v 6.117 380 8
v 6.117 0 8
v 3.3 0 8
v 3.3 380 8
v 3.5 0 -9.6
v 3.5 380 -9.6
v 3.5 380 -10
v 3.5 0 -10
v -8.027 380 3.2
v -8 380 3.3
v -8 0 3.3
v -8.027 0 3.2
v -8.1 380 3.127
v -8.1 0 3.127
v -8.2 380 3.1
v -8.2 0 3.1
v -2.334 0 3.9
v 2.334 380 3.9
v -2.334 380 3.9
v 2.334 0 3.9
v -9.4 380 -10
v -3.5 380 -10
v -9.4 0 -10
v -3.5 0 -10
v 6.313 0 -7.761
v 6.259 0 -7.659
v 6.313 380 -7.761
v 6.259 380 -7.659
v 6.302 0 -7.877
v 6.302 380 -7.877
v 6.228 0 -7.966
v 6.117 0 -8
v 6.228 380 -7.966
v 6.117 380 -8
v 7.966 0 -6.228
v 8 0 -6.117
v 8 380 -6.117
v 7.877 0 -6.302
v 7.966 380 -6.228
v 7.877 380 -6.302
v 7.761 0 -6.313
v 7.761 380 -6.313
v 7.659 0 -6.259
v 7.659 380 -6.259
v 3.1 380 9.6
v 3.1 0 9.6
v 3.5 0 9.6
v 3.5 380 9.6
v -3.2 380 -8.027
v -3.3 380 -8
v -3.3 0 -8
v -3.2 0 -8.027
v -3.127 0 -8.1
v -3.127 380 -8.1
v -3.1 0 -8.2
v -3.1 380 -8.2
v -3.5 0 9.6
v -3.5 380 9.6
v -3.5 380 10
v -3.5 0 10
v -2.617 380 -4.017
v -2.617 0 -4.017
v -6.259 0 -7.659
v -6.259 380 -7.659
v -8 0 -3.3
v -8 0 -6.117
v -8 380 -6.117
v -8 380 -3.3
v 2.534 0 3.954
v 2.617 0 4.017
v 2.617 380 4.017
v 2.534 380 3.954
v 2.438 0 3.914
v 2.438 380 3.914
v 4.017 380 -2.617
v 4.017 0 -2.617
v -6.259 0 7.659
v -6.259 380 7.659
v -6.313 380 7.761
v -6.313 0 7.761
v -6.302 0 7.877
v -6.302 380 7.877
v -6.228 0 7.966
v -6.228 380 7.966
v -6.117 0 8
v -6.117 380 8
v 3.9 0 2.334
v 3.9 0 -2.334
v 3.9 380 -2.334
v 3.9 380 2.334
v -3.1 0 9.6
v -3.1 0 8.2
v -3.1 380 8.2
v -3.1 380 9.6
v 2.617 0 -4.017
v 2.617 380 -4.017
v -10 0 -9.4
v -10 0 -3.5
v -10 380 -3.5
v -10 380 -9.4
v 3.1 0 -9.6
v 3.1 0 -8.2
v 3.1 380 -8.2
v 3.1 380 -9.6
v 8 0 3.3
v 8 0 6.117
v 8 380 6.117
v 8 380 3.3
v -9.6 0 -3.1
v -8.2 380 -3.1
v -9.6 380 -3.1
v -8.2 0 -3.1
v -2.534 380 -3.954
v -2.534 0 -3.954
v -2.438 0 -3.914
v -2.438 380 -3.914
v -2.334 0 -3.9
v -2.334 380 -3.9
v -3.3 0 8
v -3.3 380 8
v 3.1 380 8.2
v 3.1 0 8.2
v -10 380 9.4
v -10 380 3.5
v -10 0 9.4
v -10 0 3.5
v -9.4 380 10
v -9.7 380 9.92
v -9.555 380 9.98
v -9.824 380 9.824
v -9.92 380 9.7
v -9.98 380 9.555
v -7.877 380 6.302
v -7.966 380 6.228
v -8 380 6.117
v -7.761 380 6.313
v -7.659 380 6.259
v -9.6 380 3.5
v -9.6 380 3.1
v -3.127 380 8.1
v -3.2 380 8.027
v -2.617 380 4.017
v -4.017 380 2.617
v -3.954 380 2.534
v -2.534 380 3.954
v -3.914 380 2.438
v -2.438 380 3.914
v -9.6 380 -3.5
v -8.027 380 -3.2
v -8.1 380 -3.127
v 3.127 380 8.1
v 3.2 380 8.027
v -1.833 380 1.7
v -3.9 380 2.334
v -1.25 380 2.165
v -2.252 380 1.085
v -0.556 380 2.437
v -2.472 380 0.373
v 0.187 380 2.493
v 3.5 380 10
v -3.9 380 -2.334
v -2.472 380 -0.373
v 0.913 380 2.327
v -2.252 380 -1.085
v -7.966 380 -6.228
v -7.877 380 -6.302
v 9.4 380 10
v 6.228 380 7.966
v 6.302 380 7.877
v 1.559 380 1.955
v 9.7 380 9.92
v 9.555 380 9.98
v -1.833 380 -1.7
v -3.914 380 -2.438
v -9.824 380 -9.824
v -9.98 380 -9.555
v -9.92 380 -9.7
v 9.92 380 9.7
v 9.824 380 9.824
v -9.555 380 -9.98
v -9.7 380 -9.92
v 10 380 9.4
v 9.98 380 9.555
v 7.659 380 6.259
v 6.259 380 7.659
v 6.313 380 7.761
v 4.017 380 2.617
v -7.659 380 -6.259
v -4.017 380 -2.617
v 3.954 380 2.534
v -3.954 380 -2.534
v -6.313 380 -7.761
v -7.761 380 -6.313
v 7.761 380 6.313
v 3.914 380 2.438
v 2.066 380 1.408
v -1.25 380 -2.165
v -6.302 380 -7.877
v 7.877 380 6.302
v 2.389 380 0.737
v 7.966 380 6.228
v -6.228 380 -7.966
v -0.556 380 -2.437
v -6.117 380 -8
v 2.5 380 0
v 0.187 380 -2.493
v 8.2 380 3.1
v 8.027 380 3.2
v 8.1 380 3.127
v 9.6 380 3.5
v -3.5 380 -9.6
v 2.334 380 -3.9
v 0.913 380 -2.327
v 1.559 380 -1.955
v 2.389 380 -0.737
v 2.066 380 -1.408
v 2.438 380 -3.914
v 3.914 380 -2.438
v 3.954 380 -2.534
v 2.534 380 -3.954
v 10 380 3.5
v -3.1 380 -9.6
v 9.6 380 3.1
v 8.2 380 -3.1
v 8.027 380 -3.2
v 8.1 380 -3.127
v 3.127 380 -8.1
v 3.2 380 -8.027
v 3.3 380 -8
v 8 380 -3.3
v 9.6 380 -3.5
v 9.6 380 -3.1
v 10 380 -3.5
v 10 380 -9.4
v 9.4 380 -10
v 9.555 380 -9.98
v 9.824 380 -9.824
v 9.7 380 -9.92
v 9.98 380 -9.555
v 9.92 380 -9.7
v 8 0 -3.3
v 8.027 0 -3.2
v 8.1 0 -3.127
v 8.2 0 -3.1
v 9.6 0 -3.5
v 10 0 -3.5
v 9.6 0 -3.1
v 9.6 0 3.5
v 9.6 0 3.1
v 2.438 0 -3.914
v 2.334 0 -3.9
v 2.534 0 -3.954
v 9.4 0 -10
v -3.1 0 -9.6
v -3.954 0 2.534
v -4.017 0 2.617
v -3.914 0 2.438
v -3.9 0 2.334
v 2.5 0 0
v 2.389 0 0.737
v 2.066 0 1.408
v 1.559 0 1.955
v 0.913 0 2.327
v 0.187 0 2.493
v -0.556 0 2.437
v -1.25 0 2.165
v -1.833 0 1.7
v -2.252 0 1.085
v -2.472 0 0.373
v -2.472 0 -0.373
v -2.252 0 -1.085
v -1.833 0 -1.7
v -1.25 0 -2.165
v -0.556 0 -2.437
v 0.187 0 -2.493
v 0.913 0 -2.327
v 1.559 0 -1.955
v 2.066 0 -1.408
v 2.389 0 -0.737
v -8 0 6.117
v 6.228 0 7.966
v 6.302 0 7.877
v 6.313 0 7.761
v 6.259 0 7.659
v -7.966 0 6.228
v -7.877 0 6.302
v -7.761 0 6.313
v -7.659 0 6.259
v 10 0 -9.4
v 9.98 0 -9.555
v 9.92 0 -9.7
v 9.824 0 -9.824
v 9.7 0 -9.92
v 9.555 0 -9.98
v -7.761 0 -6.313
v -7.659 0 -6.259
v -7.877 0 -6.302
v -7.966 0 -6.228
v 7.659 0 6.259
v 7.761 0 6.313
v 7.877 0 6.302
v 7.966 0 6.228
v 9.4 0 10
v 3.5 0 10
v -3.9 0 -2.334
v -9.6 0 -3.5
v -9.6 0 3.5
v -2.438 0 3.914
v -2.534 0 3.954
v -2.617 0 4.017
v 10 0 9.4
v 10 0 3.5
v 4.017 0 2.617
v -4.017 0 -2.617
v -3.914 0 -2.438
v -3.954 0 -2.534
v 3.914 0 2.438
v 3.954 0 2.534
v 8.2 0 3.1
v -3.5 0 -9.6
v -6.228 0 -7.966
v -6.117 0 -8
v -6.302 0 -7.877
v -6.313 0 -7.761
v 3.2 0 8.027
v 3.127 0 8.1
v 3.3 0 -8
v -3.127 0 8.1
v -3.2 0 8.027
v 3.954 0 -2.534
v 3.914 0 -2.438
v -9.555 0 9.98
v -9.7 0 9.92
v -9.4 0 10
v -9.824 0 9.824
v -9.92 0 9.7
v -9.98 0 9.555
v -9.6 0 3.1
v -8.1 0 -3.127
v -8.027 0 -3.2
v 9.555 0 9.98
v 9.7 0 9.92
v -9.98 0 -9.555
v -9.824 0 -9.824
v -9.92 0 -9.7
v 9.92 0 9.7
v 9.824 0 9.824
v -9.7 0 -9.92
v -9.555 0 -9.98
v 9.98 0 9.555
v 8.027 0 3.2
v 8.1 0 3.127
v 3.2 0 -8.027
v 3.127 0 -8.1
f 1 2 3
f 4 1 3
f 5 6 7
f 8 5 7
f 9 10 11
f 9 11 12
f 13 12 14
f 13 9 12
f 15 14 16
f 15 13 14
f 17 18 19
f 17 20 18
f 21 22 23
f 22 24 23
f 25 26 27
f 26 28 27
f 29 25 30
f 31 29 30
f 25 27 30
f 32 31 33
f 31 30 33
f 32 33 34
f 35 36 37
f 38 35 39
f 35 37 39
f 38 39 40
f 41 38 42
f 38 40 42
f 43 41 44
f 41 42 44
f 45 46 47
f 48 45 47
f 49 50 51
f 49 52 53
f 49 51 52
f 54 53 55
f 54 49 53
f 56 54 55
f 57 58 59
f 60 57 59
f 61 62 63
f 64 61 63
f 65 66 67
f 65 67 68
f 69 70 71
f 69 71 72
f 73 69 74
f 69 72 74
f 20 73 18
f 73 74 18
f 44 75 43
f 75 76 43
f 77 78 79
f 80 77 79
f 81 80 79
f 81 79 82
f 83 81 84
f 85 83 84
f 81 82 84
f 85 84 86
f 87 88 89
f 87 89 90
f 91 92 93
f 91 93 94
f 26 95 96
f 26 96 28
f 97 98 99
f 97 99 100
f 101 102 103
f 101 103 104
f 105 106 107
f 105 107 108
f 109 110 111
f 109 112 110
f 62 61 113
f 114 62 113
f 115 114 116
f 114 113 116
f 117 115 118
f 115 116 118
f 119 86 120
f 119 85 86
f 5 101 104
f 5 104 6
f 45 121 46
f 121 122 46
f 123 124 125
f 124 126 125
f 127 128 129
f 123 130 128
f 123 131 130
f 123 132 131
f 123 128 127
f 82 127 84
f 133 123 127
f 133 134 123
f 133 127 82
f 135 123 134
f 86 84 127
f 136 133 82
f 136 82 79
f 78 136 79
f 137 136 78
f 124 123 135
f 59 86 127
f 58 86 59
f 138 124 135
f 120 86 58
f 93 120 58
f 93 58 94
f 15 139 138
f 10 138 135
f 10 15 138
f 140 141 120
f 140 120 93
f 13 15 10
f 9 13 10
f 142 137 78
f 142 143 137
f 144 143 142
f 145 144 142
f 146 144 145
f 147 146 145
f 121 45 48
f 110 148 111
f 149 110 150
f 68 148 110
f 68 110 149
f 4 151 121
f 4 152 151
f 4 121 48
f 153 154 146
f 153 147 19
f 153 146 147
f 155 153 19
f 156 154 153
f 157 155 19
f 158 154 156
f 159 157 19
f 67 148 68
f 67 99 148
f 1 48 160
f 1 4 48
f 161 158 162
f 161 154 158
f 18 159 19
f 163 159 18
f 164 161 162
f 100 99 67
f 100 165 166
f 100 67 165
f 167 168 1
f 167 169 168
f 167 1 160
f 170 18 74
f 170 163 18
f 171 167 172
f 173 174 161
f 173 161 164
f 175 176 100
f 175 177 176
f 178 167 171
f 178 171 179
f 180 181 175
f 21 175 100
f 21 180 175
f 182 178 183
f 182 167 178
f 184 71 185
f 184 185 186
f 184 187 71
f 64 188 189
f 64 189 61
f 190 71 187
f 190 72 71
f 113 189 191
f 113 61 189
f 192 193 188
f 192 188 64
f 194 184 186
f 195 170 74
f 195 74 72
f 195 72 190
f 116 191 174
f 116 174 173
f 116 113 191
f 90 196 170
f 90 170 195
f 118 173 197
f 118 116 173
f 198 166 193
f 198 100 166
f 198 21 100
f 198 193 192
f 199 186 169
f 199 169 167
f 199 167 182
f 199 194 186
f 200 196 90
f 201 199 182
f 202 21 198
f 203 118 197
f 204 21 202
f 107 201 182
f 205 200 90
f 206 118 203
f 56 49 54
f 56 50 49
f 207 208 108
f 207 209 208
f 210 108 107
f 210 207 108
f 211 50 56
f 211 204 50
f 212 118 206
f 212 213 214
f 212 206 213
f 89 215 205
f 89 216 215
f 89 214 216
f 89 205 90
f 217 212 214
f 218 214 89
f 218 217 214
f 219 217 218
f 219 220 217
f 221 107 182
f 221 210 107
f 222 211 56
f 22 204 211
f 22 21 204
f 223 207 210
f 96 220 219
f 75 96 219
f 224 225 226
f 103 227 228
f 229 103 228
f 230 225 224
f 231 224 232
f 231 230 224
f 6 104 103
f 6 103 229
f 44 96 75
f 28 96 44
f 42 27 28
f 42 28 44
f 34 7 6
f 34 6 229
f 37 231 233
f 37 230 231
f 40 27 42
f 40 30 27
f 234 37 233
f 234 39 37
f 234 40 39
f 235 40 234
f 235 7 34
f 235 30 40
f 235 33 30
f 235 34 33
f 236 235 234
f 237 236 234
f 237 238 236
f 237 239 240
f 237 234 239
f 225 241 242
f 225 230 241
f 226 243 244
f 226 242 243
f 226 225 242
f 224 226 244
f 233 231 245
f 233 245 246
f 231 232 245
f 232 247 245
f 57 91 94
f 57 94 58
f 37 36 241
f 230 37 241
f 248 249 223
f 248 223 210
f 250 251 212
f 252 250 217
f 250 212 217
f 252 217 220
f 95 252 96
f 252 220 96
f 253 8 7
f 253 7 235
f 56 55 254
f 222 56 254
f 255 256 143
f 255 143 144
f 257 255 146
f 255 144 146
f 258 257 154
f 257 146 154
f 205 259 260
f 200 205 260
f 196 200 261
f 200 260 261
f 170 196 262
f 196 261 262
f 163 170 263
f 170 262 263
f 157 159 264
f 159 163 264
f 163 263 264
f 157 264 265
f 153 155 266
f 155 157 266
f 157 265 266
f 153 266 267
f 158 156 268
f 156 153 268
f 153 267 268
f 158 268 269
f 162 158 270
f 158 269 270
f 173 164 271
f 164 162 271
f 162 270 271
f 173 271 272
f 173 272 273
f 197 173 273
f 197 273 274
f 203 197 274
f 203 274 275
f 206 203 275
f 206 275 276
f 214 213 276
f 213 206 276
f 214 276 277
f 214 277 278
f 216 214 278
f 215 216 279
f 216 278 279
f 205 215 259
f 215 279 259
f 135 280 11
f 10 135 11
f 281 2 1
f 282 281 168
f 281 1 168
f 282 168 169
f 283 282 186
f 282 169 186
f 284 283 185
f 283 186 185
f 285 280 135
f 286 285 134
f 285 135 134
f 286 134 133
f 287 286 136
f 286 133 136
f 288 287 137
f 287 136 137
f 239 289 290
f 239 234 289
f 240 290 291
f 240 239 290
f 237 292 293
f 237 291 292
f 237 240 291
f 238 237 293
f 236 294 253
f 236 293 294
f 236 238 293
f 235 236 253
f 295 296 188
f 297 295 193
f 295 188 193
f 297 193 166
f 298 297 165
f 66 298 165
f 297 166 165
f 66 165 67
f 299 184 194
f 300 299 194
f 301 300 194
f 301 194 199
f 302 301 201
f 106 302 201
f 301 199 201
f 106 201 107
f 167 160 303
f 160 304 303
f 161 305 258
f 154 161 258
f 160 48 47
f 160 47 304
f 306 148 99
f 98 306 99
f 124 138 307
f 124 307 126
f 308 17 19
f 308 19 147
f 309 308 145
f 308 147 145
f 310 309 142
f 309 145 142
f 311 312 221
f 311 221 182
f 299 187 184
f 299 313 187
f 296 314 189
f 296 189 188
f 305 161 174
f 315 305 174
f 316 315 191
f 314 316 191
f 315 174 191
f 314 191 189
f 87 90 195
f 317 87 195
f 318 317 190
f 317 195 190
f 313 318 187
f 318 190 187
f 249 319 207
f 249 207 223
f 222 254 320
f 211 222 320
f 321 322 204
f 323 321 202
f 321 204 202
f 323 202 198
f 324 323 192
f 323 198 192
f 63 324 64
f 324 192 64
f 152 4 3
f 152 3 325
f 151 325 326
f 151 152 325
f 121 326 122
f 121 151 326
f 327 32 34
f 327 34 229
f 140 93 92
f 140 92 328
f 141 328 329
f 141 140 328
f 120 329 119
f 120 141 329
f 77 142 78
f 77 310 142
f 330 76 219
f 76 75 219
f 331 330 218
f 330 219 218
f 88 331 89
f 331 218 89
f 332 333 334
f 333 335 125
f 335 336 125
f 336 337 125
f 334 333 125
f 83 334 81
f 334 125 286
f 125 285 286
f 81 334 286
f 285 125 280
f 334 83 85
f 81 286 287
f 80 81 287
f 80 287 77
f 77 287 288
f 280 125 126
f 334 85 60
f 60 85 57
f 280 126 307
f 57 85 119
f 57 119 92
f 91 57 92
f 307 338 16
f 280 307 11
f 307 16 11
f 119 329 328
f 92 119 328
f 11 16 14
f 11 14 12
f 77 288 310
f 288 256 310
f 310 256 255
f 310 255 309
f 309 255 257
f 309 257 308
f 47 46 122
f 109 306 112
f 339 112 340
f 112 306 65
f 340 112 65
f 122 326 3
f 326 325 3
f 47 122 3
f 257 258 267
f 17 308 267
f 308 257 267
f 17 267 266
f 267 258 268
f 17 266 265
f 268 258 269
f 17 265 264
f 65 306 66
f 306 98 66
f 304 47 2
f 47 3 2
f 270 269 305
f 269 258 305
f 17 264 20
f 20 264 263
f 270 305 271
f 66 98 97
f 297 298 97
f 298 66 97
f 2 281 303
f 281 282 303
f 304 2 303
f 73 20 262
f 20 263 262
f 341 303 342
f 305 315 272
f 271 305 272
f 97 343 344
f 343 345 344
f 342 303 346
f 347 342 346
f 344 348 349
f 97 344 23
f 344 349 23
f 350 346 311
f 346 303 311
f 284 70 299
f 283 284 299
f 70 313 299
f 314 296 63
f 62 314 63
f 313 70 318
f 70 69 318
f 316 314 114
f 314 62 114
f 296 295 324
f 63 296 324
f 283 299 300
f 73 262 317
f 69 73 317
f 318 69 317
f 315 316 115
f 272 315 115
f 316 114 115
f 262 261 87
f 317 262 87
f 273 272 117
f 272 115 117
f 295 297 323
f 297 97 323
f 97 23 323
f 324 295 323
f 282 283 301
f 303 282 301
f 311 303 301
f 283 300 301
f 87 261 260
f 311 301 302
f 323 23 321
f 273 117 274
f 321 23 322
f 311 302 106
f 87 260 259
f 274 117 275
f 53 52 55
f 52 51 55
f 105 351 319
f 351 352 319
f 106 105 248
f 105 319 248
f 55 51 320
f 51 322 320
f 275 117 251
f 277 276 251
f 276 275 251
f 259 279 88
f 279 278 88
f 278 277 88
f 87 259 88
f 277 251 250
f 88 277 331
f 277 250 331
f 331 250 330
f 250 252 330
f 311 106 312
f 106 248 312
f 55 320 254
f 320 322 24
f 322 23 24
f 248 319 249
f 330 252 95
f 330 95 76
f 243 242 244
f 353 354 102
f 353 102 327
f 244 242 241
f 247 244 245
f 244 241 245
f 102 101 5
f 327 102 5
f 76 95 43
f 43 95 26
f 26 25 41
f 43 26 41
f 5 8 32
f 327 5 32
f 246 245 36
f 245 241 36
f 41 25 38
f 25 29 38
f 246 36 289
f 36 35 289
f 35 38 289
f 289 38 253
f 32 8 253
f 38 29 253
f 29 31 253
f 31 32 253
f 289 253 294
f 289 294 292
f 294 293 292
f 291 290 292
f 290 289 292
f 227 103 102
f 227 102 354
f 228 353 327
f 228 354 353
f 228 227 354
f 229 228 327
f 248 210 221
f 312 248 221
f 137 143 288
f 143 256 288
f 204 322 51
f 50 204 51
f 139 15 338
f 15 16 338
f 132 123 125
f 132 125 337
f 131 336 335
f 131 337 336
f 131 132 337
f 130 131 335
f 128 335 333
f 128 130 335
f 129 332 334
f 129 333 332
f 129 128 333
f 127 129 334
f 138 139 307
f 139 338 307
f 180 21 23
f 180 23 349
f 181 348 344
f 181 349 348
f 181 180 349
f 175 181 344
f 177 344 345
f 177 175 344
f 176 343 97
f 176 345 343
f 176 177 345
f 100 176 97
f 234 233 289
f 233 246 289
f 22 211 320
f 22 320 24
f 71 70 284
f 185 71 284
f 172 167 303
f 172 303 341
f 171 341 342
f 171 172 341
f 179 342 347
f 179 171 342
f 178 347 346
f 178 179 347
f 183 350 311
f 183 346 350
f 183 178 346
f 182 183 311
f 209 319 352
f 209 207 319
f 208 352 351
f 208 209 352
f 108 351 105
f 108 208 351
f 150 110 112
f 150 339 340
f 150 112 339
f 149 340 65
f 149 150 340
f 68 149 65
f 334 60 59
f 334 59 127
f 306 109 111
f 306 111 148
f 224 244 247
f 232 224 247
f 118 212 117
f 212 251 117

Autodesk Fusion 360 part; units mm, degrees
sketch "profile" plane through (0, 0, 0) normal (0, 1, 0) x (1, 0, 0)
  circle A0 centre (0, 0) radius 2.5
  line L0 (0, -3.9) -> (-2.5, -3.9)
  line L1 (4, -4) -> (-4, 4) construction
  line L2 (-3.9092, -3.9092) -> (4, 4) construction
  line L3 (10, -10) -> (-10, -10) construction
  line L4 (-10, -10) -> (-10, 10) construction
  line L5 (-10, 10) -> (10, 10) construction
  line L6 (10, 10) -> (10, -10) construction
  line L7 (10, -10) -> (-10, 10) construction
  line L8 (-10, -10) -> (10, 10) construction
  line L9 (8, -8) -> (-8, -8) construction
  line L10 (-8, -8) -> (-8, 8) construction
  line L11 (-8, 8) -> (8, 8) construction
  line L12 (8, 8) -> (8, -8) construction
  line L13 (8, -8) -> (-8, 8) construction
  line L14 (-8, -8) -> (8, 8) construction
  line L15 (0, -8) -> (0, -10) construction
  line L16 (0, -9) -> (-3.1, -9) construction
  line L17 (-3.1, -8) -> (-3.1, -9.6)
  line L18 (-1.75, -10) -> (-1.75, -9.6) construction
  line L19 (0, -9.6) -> (-3.5, -9.6) construction
  line L20 (-3.1, -9.6) -> (-3.5, -9.6)
  line L21 (-3.5, -9.6) -> (-3.5, -10)
  line L22 (0, 0) -> (0, -8) construction
  line L23 (-3.5, -10) -> (-10, -10)
  line L24 (-3.9092, -3.9092) -> (-2.5, -3.9) construction
  line L25 (-8, -8) -> (-6.6, -8) construction
  line L26 (-8, -8) -> (-8, -7) construction
  line L27 (-2.5, -3.9) -> (-6.6, -8)
  line L28 (-6.6, -8) -> (-3.1, -8)
  line L29 (0, -2.5) -> (0, -3.9) construction
  line L30 (-3.9, 0) -> (-3.9, -2.5)
  line L31 (-3.9, -2.5) -> (-8, -6.6)
  line L32 (-8, -6.6) -> (-8, -3.1)
  line L33 (-8, -3.1) -> (-9.6, -3.1)
  line L34 (-9.6, -3.1) -> (-9.6, -3.5)
  line L35 (-9.6, -3.5) -> (-10, -3.5)
  line L36 (-10, -3.5) -> (-10, -10)
  line L37 (0, 0) -> (10, 0) construction
  line L38 (3.9, 0) -> (3.9, -2.5)
  line L39 (3.9, -2.5) -> (8, -6.6)
  line L40 (8, -6.6) -> (8, -3.1)
  line L41 (8, -3.1) -> (9.6, -3.1)
  line L42 (9.6, -3.1) -> (9.6, -3.5)
  line L43 (9.6, -3.5) -> (10, -3.5)
  line L44 (10, -3.5) -> (10, -10)
  line L45 (0, -3.9) -> (2.5, -3.9)
  line L46 (6.6, -8) -> (3.1, -8)
  line L47 (3.1, -8) -> (3.1, -9.6)
  line L48 (3.1, -9.6) -> (3.5, -9.6)
  line L49 (3.5, -9.6) -> (3.5, -10)
  line L50 (3.5, -10) -> (10, -10)
  line L51 (2.5, -3.9) -> (6.6, -8)
  line L52 (-3.9, 0) -> (-3.9, 2.5)
  line L53 (-3.9, 2.5) -> (-8, 6.6)
  line L54 (-8, 6.6) -> (-8, 3.1)
  line L55 (-8, 3.1) -> (-9.6, 3.1)
  line L56 (-9.6, 3.1) -> (-9.6, 3.5)
  line L57 (-9.6, 3.5) -> (-10, 3.5)
  line L58 (-10, 3.5) -> (-10, 10)
  line L59 (0, 3.9) -> (-2.5, 3.9)
  line L60 (-6.6, 8) -> (-3.1, 8)
  line L61 (-3.1, 8) -> (-3.1, 9.6)
  line L62 (-3.1, 9.6) -> (-3.5, 9.6)
  line L63 (-3.5, 9.6) -> (-3.5, 10)
  line L64 (-3.5, 10) -> (-10, 10)
  line L65 (-2.5, 3.9) -> (-6.6, 8)
  line L66 (0, 3.9) -> (2.5, 3.9)
  line L67 (6.6, 8) -> (3.1, 8)
  line L68 (3.1, 8) -> (3.1, 9.6)
  line L69 (3.1, 9.6) -> (3.5, 9.6)
  line L70 (3.5, 9.6) -> (3.5, 10)
  line L71 (3.5, 10) -> (10, 10)
  line L72 (2.5, 3.9) -> (6.6, 8)
  line L73 (3.9, 0) -> (3.9, 2.5)
  line L74 (8, 6.6) -> (8, 3.1)
  line L75 (8, 3.1) -> (9.6, 3.1)
  line L76 (9.6, 3.1) -> (9.6, 3.5)
  line L77 (9.6, 3.5) -> (10, 3.5)
  line L78 (10, 3.5) -> (10, 10)
  line L79 (3.9, 2.5) -> (8, 6.6)
  dimension "d3" = 5
  dimension "d7" = 8
  dimension "d8" = 8
  dimension "d9" = 20
  dimension "d10" = 20
  dimension "d11" = 16
  dimension "d12" = 16
  dimension "d13" = 3.1
  dimension "d14" = 0.4
  dimension "d15" = 3.5
  dimension "d20" = 2.5
  dimension "d21" = 1.4
extrude "Extrude3" add sketch "profile" along normal blind 380
fillet "Fillet1" radius 0.6 4 edges at (-10, 190, 10) (10, 190, 10) (10, 190, -10) (-10, 190, -10)
fillet "Fillet1" radius 0.2 8 edges at (3.1, 190, 8) (8, 190, 3.1) (8, 190, -3.1) (3.1, 190, -8) (-3.1, 190, 8) (-8, 190, 3.1) (-3.1, 190, -8) (-8, 190, -3.1)
fillet "Fillet1" radius 0.2 8 edges at (-8, 190, 6.6) (-6.6, 190, 8) (6.6, 190, 8) (8, 190, 6.6) (8, 190, -6.6) (6.6, 190, -8) (-6.6, 190, -8) (-8, 190, -6.6)
fillet "Fillet1" radius 0.4 8 edges at (-2.5, 190, 3.9) (2.5, 190, 3.9) (3.9, 190, 2.5) (3.9, 190, -2.5) (2.5, 190, -3.9) (-2.5, 190, -3.9) (-3.9, 190, -2.5) (-3.9, 190, 2.5)
equation "d13 = ( 6.2 / 2 ) * 1 mm"
equation "d15 = 7 mm / 2"
